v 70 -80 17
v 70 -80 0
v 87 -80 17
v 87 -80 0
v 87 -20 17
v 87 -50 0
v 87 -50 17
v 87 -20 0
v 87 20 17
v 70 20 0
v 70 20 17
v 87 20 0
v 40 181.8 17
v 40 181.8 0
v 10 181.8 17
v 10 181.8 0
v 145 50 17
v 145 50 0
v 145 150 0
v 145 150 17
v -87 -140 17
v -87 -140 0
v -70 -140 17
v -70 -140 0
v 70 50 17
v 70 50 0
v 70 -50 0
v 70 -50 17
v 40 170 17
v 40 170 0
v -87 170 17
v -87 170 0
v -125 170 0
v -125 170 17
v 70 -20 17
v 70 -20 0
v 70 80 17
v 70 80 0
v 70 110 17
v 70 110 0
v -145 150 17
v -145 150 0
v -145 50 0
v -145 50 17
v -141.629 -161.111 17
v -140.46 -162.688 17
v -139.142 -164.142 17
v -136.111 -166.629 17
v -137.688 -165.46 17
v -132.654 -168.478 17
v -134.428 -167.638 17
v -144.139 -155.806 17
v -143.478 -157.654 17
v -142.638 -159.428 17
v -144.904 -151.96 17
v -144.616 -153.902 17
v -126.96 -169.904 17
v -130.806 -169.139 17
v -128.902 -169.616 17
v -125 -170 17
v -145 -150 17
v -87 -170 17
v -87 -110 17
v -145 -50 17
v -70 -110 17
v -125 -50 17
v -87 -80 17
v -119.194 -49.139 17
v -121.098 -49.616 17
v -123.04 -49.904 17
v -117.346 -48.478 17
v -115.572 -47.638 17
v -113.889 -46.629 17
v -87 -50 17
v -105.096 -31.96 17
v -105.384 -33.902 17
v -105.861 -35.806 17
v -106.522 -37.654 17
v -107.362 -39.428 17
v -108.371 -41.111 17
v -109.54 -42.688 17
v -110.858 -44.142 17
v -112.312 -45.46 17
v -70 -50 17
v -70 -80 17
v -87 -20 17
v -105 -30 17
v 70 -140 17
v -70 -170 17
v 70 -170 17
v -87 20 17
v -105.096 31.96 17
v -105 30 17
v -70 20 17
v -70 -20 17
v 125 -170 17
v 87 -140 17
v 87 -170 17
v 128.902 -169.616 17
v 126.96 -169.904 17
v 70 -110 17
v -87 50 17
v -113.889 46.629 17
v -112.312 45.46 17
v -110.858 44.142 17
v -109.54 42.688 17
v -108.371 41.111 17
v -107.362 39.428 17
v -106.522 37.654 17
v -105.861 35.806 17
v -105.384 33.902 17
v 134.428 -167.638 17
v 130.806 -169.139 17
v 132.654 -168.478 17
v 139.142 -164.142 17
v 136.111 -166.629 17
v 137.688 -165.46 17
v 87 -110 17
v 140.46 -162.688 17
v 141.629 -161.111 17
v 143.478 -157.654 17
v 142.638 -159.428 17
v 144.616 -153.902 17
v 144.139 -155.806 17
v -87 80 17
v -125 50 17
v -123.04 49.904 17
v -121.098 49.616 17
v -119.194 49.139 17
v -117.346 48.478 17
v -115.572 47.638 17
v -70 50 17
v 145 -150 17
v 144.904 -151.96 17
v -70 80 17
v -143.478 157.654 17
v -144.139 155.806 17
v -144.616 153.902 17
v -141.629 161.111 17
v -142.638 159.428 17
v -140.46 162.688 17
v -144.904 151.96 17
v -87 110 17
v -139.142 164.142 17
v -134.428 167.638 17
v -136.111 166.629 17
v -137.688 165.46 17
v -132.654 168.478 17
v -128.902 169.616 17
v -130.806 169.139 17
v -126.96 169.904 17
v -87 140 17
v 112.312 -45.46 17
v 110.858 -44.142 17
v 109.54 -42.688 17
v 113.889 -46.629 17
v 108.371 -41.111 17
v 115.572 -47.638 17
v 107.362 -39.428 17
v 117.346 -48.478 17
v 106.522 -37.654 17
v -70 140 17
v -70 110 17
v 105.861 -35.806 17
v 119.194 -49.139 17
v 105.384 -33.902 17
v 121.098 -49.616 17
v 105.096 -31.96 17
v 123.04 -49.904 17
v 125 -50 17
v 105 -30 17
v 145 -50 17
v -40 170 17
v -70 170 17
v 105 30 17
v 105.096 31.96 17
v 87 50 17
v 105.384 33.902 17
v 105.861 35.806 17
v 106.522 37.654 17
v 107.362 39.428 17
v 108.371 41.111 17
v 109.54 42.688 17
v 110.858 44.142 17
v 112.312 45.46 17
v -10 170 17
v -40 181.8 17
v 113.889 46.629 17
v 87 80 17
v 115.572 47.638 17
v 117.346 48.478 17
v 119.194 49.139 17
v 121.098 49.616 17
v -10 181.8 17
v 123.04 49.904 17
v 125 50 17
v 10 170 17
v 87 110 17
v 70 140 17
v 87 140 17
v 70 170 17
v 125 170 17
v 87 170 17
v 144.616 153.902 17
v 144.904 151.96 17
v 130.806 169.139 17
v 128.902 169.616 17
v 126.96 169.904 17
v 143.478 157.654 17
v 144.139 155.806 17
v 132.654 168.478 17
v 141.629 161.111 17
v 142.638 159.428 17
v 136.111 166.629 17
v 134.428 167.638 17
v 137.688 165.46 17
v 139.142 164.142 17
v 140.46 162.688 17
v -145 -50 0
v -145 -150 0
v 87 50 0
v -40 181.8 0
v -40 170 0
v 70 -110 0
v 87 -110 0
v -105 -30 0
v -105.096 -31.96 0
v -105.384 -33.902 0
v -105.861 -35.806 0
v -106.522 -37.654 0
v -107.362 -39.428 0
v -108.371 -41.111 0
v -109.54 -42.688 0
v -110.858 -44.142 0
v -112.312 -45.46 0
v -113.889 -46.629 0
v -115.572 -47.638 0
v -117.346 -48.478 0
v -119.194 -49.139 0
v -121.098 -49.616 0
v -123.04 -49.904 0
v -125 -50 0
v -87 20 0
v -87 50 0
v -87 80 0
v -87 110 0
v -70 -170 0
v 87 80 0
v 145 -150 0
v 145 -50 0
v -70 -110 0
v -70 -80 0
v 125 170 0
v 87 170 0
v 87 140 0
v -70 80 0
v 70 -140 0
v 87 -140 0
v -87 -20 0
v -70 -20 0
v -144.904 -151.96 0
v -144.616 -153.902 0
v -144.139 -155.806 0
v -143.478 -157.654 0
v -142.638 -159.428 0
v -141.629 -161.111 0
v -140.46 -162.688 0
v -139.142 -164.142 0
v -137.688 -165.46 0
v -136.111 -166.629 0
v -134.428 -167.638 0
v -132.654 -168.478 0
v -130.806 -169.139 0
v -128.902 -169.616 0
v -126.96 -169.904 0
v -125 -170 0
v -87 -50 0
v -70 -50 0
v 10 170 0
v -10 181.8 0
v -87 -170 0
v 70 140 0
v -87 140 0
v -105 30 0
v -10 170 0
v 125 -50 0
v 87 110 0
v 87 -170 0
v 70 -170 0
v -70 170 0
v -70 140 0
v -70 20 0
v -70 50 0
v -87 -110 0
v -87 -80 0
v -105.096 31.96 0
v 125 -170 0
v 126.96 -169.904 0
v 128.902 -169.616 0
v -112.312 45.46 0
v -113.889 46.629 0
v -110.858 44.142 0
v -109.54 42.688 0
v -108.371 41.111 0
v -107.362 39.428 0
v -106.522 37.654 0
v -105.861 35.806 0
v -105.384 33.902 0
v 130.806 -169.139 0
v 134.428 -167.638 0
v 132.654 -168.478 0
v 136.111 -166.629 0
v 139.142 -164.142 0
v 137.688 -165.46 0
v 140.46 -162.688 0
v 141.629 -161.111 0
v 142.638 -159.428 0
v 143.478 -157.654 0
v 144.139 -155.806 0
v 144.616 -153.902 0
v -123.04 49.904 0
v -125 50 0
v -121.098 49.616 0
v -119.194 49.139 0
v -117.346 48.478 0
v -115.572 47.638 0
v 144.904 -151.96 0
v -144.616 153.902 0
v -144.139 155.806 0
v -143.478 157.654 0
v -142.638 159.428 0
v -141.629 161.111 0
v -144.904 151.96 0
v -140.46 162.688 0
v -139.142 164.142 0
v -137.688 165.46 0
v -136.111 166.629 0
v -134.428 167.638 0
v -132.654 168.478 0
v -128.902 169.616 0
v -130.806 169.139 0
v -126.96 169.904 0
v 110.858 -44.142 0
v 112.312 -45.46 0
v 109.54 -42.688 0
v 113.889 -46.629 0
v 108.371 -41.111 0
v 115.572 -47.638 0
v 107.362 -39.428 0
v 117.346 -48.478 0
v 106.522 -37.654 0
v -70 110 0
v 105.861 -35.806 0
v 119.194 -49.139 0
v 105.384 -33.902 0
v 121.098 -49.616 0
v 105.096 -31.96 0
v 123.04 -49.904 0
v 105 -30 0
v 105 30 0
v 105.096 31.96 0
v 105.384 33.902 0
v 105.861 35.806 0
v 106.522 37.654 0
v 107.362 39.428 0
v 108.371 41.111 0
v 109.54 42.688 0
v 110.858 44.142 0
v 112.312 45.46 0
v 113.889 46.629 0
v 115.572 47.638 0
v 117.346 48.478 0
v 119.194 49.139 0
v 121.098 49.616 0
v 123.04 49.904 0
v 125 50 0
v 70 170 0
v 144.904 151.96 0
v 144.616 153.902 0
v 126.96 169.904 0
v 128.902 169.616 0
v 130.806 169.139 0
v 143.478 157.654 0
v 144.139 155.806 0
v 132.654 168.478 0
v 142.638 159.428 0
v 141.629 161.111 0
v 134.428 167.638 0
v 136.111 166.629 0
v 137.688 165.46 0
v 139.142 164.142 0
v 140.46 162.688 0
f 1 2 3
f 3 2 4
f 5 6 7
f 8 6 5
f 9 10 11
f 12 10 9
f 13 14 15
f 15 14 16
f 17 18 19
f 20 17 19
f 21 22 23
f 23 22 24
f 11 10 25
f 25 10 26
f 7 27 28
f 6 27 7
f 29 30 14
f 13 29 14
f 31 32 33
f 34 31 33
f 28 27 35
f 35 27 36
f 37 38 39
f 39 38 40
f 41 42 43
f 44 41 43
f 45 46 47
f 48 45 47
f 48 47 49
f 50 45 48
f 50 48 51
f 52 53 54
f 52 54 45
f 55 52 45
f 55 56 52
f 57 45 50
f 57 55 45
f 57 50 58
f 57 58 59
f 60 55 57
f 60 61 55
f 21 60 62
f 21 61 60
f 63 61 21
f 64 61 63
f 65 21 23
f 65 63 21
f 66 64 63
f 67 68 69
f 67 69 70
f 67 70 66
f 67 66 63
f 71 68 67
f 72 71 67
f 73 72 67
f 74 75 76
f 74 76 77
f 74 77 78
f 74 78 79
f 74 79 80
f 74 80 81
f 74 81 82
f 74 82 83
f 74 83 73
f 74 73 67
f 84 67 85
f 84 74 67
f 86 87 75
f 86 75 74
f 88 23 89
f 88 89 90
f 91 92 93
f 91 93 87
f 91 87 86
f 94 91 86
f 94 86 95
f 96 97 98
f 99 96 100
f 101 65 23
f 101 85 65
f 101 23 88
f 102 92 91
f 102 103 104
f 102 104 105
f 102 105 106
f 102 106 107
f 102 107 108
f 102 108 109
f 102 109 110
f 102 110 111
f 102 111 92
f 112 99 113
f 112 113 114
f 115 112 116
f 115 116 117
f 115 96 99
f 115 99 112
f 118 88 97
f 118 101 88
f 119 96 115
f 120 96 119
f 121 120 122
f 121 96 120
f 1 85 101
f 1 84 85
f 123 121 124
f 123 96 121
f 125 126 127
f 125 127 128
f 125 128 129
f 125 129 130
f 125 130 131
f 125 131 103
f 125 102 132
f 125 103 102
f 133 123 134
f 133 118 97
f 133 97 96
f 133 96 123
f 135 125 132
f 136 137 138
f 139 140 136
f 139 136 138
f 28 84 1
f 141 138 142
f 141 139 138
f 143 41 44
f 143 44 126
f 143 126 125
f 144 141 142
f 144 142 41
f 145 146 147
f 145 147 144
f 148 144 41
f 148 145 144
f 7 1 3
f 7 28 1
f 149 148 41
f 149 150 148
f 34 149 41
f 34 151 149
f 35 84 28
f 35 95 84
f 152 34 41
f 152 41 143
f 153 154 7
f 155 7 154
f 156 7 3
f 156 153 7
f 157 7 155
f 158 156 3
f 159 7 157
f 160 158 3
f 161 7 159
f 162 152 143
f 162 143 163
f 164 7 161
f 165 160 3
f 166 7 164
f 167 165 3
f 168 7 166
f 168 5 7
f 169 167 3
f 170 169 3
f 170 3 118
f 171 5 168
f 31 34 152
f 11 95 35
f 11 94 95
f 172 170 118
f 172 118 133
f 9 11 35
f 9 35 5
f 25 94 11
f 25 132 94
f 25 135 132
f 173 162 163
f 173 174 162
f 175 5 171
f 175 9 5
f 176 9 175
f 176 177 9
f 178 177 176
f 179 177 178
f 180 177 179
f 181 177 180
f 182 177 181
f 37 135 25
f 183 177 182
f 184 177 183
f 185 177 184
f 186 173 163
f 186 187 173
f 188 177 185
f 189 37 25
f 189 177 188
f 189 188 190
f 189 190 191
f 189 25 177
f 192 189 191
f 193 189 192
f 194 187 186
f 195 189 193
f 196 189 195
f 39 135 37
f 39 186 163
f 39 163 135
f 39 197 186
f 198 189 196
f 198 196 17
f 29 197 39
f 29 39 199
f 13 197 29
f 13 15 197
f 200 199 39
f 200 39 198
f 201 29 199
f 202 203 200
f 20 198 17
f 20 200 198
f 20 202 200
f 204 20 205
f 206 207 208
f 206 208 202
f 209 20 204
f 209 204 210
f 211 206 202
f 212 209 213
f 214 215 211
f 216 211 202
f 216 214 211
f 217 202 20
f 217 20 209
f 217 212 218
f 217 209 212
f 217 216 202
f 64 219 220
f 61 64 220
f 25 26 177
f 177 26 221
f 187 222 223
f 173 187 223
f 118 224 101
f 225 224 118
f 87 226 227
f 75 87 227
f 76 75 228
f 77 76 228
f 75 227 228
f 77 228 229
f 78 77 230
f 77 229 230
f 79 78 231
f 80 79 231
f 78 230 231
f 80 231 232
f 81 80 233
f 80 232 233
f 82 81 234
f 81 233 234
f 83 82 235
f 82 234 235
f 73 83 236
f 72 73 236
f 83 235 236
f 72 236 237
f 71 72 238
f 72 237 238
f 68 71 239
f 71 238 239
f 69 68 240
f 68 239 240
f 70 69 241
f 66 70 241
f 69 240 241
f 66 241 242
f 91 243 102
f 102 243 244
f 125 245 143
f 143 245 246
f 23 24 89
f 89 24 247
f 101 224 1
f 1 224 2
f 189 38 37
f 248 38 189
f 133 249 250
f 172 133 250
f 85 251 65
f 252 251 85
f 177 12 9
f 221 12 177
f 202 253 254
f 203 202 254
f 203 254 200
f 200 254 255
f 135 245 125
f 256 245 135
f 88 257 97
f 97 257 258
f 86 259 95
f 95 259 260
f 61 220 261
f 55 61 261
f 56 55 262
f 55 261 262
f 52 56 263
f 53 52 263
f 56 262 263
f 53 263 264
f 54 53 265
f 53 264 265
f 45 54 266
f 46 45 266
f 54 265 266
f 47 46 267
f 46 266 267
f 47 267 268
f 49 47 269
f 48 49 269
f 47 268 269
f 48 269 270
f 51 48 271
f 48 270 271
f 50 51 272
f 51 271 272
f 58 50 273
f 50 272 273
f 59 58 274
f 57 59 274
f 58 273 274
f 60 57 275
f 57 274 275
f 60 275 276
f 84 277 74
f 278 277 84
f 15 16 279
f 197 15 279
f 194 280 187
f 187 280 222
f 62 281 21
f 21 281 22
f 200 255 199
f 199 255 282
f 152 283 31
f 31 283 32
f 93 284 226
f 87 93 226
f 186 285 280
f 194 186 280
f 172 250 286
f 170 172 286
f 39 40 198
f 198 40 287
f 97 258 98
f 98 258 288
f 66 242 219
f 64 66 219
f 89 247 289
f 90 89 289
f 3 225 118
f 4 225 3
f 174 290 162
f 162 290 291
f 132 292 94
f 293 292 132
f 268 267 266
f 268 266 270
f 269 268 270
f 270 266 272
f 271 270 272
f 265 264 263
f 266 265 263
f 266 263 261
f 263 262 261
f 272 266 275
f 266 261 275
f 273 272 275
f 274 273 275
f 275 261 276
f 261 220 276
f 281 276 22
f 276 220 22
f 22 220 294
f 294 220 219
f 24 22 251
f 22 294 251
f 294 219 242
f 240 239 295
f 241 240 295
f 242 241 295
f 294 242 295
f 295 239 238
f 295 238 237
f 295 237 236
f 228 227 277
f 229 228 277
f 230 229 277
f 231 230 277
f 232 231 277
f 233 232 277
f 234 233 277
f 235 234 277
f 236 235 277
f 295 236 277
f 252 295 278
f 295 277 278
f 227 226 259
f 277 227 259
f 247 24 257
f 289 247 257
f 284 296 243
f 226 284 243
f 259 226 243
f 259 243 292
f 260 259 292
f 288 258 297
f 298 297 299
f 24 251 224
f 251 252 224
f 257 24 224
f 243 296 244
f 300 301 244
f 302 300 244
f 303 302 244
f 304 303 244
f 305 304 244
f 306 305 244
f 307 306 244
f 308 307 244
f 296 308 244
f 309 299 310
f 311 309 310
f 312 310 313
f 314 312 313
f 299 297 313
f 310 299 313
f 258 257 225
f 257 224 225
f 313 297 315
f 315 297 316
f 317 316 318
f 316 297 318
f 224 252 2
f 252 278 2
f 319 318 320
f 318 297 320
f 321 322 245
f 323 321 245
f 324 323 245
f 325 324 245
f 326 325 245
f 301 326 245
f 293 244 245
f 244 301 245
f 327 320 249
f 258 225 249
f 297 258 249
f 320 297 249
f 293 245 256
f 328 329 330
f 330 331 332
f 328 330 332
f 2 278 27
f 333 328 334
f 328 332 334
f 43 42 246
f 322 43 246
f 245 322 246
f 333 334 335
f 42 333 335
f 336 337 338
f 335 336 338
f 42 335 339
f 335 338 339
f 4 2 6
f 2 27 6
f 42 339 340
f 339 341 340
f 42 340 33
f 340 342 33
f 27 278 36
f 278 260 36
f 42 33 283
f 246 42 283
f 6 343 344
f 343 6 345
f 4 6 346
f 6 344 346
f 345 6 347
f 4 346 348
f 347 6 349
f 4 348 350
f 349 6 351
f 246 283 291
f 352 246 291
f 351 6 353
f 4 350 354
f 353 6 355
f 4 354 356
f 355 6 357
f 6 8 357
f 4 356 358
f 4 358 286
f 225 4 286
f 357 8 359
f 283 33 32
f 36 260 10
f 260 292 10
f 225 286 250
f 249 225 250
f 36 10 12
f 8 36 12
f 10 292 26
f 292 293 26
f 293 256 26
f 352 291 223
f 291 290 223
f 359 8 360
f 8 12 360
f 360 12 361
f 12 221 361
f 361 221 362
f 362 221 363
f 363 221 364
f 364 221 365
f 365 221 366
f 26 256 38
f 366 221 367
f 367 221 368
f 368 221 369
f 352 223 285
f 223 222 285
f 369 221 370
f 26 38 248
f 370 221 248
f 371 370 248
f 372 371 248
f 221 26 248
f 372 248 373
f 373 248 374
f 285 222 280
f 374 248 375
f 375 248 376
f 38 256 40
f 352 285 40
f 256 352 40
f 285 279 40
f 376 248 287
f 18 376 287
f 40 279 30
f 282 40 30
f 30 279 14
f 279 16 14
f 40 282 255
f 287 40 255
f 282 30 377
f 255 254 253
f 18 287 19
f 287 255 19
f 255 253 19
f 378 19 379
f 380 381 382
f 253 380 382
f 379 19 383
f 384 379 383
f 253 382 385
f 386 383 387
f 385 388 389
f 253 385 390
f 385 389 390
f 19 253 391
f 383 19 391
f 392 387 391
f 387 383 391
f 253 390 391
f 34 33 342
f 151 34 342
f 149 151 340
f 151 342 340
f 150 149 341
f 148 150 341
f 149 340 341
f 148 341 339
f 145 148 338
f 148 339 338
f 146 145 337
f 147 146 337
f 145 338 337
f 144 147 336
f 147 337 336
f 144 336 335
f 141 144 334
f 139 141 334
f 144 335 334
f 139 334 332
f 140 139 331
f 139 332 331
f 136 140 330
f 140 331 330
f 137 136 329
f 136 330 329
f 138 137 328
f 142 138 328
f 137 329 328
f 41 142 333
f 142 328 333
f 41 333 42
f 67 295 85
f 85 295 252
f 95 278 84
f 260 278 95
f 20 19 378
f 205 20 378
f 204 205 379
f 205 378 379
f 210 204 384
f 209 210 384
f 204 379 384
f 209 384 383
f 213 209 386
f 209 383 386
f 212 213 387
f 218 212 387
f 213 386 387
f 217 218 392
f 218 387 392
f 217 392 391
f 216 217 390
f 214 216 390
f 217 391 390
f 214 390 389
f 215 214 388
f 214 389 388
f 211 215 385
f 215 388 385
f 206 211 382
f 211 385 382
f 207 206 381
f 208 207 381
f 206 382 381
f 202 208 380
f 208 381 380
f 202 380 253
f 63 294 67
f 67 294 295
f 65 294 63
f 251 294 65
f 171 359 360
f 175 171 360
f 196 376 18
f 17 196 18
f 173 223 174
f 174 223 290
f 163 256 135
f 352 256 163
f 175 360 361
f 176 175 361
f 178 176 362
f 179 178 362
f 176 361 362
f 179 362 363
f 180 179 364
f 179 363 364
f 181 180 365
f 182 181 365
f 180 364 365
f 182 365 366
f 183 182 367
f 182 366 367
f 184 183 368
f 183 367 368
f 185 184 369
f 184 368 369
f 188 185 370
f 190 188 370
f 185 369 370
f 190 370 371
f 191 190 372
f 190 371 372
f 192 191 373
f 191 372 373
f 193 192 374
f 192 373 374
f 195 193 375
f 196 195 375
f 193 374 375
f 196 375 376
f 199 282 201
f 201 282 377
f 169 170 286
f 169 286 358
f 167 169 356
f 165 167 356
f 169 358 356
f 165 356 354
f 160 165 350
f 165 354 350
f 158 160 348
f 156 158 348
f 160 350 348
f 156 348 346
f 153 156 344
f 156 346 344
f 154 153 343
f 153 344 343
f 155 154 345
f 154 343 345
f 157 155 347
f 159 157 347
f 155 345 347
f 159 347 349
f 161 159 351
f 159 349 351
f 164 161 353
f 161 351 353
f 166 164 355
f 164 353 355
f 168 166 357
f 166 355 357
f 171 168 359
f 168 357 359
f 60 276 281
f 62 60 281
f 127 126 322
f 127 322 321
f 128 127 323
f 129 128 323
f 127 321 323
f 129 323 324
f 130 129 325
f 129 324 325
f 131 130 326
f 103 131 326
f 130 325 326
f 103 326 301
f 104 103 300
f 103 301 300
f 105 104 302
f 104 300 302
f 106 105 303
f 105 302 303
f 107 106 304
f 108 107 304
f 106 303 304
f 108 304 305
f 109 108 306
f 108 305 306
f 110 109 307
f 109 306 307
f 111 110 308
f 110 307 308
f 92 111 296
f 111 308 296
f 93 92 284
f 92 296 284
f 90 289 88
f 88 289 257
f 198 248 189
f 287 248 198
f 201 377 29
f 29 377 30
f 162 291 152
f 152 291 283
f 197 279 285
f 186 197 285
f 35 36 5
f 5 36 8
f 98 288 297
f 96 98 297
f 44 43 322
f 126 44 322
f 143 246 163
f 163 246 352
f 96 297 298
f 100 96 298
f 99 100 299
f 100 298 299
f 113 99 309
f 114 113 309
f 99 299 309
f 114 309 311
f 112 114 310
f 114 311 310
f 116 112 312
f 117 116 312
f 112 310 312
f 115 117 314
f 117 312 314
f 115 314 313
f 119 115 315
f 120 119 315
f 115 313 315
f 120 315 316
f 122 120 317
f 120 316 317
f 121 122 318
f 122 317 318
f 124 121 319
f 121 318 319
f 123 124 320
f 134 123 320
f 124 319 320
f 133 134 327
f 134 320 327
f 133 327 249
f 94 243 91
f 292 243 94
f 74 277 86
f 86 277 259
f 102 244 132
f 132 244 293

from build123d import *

# Parameters (mm, degrees)
SKETCH1_W           = 17
SKETCH1_H           = 30
BOSS_EXTRUDE1_DEPTH = 17


with BuildPart() as part:
    # Sketch1 → Boss-Extrude1 (new body)
    with BuildSketch(Plane.XY):
        with BuildLine():
            Line((-125, -170), (-87, -170))
            Line((-87, -170), (-87, -140))
            Line((-87, -140), (-70, -140))
            Line((-70, -140), (-70, -170))
            Line((-70, -170), (-40, -170))
            Line((-40, -170), (40, -170))
            Line((40, -170), (70, -170))
            Line((70, -170), (70, -140))
            Line((70, -140), (87, -140))
            Line((87, -140), (87, -170))
            Line((87, -170), (125, -170))
            ThreePointArc((125, -170), (139.142135624, -164.142135624), (145, -150))
            Line((145, -150), (145, -50))
            Line((145, -50), (125, -50))
            ThreePointArc((125, -50), (110.857864376, -44.142135624), (105, -30))
            Line((105, -30), (105, 0))
            Line((105, 0), (105, 30))
            ThreePointArc((105, 30), (110.857864376, 44.142135624), (125, 50))
            Line((125, 50), (145, 50))
            Line((145, 50), (145, 150))
            ThreePointArc((145, 150), (139.142135624, 164.142135624), (125, 170))
            Line((125, 170), (87, 170))
            Line((87, 170), (87, 140))
            Line((87, 140), (70, 140))
            Line((70, 140), (70, 170))
            Line((70, 170), (40, 170))
            Line((40, 170), (40, 181.8))
            Line((40, 181.8), (10, 181.8))
            Line((10, 181.8), (10, 170))
            Line((10, 170), (-10, 170))
            Line((-10, 170), (-10, 181.8))
            Line((-10, 181.8), (-40, 181.8))
            Line((-40, 181.8), (-40, 170))
            Line((-40, 170), (-70, 170))
            Line((-70, 170), (-70, 140))
            Line((-70, 140), (-87, 140))
            Line((-87, 140), (-87, 170))
            Line((-87, 170), (-125, 170))
            ThreePointArc((-125, 170), (-139.142135624, 164.142135624), (-145, 150))
            Line((-145, 150), (-145, 50))
            Line((-145, 50), (-125, 50))
            ThreePointArc((-125, 50), (-110.857864376, 44.142135624), (-105, 30))
            Line((-105, 30), (-105, 0))
            Line((-105, 0), (-105, -30))
            ThreePointArc((-105, -30), (-110.857864376, -44.142135624), (-125, -50))
            Line((-125, -50), (-145, -50))
            Line((-145, -50), (-145, -150))
            ThreePointArc((-145, -150), (-139.142135624, -164.142135624), (-125, -170))
        make_face()
        with Locations((-78.5, -95)):
            Rectangle(SKETCH1_W, SKETCH1_H, mode=Mode.SUBTRACT)
        with Locations((-78.5, -35)):
            Rectangle(SKETCH1_W, SKETCH1_H, mode=Mode.SUBTRACT)
        with Locations((-78.5, 35)):
            Rectangle(SKETCH1_W, SKETCH1_H, mode=Mode.SUBTRACT)
        with Locations((78.5, 95)):
            Rectangle(SKETCH1_W, SKETCH1_H, mode=Mode.SUBTRACT)
        with Locations((-78.5, 95)):
            Rectangle(SKETCH1_W, SKETCH1_H, mode=Mode.SUBTRACT)
        with Locations((78.5, 35)):
            Rectangle(SKETCH1_W, SKETCH1_H, mode=Mode.SUBTRACT)
        with Locations((78.5, -35)):
            Rectangle(SKETCH1_W, SKETCH1_H, mode=Mode.SUBTRACT)
        with Locations((78.5, -95)):
            Rectangle(SKETCH1_W, SKETCH1_H, mode=Mode.SUBTRACT)
    extrude(amount=BOSS_EXTRUDE1_DEPTH)


solid = part.part
